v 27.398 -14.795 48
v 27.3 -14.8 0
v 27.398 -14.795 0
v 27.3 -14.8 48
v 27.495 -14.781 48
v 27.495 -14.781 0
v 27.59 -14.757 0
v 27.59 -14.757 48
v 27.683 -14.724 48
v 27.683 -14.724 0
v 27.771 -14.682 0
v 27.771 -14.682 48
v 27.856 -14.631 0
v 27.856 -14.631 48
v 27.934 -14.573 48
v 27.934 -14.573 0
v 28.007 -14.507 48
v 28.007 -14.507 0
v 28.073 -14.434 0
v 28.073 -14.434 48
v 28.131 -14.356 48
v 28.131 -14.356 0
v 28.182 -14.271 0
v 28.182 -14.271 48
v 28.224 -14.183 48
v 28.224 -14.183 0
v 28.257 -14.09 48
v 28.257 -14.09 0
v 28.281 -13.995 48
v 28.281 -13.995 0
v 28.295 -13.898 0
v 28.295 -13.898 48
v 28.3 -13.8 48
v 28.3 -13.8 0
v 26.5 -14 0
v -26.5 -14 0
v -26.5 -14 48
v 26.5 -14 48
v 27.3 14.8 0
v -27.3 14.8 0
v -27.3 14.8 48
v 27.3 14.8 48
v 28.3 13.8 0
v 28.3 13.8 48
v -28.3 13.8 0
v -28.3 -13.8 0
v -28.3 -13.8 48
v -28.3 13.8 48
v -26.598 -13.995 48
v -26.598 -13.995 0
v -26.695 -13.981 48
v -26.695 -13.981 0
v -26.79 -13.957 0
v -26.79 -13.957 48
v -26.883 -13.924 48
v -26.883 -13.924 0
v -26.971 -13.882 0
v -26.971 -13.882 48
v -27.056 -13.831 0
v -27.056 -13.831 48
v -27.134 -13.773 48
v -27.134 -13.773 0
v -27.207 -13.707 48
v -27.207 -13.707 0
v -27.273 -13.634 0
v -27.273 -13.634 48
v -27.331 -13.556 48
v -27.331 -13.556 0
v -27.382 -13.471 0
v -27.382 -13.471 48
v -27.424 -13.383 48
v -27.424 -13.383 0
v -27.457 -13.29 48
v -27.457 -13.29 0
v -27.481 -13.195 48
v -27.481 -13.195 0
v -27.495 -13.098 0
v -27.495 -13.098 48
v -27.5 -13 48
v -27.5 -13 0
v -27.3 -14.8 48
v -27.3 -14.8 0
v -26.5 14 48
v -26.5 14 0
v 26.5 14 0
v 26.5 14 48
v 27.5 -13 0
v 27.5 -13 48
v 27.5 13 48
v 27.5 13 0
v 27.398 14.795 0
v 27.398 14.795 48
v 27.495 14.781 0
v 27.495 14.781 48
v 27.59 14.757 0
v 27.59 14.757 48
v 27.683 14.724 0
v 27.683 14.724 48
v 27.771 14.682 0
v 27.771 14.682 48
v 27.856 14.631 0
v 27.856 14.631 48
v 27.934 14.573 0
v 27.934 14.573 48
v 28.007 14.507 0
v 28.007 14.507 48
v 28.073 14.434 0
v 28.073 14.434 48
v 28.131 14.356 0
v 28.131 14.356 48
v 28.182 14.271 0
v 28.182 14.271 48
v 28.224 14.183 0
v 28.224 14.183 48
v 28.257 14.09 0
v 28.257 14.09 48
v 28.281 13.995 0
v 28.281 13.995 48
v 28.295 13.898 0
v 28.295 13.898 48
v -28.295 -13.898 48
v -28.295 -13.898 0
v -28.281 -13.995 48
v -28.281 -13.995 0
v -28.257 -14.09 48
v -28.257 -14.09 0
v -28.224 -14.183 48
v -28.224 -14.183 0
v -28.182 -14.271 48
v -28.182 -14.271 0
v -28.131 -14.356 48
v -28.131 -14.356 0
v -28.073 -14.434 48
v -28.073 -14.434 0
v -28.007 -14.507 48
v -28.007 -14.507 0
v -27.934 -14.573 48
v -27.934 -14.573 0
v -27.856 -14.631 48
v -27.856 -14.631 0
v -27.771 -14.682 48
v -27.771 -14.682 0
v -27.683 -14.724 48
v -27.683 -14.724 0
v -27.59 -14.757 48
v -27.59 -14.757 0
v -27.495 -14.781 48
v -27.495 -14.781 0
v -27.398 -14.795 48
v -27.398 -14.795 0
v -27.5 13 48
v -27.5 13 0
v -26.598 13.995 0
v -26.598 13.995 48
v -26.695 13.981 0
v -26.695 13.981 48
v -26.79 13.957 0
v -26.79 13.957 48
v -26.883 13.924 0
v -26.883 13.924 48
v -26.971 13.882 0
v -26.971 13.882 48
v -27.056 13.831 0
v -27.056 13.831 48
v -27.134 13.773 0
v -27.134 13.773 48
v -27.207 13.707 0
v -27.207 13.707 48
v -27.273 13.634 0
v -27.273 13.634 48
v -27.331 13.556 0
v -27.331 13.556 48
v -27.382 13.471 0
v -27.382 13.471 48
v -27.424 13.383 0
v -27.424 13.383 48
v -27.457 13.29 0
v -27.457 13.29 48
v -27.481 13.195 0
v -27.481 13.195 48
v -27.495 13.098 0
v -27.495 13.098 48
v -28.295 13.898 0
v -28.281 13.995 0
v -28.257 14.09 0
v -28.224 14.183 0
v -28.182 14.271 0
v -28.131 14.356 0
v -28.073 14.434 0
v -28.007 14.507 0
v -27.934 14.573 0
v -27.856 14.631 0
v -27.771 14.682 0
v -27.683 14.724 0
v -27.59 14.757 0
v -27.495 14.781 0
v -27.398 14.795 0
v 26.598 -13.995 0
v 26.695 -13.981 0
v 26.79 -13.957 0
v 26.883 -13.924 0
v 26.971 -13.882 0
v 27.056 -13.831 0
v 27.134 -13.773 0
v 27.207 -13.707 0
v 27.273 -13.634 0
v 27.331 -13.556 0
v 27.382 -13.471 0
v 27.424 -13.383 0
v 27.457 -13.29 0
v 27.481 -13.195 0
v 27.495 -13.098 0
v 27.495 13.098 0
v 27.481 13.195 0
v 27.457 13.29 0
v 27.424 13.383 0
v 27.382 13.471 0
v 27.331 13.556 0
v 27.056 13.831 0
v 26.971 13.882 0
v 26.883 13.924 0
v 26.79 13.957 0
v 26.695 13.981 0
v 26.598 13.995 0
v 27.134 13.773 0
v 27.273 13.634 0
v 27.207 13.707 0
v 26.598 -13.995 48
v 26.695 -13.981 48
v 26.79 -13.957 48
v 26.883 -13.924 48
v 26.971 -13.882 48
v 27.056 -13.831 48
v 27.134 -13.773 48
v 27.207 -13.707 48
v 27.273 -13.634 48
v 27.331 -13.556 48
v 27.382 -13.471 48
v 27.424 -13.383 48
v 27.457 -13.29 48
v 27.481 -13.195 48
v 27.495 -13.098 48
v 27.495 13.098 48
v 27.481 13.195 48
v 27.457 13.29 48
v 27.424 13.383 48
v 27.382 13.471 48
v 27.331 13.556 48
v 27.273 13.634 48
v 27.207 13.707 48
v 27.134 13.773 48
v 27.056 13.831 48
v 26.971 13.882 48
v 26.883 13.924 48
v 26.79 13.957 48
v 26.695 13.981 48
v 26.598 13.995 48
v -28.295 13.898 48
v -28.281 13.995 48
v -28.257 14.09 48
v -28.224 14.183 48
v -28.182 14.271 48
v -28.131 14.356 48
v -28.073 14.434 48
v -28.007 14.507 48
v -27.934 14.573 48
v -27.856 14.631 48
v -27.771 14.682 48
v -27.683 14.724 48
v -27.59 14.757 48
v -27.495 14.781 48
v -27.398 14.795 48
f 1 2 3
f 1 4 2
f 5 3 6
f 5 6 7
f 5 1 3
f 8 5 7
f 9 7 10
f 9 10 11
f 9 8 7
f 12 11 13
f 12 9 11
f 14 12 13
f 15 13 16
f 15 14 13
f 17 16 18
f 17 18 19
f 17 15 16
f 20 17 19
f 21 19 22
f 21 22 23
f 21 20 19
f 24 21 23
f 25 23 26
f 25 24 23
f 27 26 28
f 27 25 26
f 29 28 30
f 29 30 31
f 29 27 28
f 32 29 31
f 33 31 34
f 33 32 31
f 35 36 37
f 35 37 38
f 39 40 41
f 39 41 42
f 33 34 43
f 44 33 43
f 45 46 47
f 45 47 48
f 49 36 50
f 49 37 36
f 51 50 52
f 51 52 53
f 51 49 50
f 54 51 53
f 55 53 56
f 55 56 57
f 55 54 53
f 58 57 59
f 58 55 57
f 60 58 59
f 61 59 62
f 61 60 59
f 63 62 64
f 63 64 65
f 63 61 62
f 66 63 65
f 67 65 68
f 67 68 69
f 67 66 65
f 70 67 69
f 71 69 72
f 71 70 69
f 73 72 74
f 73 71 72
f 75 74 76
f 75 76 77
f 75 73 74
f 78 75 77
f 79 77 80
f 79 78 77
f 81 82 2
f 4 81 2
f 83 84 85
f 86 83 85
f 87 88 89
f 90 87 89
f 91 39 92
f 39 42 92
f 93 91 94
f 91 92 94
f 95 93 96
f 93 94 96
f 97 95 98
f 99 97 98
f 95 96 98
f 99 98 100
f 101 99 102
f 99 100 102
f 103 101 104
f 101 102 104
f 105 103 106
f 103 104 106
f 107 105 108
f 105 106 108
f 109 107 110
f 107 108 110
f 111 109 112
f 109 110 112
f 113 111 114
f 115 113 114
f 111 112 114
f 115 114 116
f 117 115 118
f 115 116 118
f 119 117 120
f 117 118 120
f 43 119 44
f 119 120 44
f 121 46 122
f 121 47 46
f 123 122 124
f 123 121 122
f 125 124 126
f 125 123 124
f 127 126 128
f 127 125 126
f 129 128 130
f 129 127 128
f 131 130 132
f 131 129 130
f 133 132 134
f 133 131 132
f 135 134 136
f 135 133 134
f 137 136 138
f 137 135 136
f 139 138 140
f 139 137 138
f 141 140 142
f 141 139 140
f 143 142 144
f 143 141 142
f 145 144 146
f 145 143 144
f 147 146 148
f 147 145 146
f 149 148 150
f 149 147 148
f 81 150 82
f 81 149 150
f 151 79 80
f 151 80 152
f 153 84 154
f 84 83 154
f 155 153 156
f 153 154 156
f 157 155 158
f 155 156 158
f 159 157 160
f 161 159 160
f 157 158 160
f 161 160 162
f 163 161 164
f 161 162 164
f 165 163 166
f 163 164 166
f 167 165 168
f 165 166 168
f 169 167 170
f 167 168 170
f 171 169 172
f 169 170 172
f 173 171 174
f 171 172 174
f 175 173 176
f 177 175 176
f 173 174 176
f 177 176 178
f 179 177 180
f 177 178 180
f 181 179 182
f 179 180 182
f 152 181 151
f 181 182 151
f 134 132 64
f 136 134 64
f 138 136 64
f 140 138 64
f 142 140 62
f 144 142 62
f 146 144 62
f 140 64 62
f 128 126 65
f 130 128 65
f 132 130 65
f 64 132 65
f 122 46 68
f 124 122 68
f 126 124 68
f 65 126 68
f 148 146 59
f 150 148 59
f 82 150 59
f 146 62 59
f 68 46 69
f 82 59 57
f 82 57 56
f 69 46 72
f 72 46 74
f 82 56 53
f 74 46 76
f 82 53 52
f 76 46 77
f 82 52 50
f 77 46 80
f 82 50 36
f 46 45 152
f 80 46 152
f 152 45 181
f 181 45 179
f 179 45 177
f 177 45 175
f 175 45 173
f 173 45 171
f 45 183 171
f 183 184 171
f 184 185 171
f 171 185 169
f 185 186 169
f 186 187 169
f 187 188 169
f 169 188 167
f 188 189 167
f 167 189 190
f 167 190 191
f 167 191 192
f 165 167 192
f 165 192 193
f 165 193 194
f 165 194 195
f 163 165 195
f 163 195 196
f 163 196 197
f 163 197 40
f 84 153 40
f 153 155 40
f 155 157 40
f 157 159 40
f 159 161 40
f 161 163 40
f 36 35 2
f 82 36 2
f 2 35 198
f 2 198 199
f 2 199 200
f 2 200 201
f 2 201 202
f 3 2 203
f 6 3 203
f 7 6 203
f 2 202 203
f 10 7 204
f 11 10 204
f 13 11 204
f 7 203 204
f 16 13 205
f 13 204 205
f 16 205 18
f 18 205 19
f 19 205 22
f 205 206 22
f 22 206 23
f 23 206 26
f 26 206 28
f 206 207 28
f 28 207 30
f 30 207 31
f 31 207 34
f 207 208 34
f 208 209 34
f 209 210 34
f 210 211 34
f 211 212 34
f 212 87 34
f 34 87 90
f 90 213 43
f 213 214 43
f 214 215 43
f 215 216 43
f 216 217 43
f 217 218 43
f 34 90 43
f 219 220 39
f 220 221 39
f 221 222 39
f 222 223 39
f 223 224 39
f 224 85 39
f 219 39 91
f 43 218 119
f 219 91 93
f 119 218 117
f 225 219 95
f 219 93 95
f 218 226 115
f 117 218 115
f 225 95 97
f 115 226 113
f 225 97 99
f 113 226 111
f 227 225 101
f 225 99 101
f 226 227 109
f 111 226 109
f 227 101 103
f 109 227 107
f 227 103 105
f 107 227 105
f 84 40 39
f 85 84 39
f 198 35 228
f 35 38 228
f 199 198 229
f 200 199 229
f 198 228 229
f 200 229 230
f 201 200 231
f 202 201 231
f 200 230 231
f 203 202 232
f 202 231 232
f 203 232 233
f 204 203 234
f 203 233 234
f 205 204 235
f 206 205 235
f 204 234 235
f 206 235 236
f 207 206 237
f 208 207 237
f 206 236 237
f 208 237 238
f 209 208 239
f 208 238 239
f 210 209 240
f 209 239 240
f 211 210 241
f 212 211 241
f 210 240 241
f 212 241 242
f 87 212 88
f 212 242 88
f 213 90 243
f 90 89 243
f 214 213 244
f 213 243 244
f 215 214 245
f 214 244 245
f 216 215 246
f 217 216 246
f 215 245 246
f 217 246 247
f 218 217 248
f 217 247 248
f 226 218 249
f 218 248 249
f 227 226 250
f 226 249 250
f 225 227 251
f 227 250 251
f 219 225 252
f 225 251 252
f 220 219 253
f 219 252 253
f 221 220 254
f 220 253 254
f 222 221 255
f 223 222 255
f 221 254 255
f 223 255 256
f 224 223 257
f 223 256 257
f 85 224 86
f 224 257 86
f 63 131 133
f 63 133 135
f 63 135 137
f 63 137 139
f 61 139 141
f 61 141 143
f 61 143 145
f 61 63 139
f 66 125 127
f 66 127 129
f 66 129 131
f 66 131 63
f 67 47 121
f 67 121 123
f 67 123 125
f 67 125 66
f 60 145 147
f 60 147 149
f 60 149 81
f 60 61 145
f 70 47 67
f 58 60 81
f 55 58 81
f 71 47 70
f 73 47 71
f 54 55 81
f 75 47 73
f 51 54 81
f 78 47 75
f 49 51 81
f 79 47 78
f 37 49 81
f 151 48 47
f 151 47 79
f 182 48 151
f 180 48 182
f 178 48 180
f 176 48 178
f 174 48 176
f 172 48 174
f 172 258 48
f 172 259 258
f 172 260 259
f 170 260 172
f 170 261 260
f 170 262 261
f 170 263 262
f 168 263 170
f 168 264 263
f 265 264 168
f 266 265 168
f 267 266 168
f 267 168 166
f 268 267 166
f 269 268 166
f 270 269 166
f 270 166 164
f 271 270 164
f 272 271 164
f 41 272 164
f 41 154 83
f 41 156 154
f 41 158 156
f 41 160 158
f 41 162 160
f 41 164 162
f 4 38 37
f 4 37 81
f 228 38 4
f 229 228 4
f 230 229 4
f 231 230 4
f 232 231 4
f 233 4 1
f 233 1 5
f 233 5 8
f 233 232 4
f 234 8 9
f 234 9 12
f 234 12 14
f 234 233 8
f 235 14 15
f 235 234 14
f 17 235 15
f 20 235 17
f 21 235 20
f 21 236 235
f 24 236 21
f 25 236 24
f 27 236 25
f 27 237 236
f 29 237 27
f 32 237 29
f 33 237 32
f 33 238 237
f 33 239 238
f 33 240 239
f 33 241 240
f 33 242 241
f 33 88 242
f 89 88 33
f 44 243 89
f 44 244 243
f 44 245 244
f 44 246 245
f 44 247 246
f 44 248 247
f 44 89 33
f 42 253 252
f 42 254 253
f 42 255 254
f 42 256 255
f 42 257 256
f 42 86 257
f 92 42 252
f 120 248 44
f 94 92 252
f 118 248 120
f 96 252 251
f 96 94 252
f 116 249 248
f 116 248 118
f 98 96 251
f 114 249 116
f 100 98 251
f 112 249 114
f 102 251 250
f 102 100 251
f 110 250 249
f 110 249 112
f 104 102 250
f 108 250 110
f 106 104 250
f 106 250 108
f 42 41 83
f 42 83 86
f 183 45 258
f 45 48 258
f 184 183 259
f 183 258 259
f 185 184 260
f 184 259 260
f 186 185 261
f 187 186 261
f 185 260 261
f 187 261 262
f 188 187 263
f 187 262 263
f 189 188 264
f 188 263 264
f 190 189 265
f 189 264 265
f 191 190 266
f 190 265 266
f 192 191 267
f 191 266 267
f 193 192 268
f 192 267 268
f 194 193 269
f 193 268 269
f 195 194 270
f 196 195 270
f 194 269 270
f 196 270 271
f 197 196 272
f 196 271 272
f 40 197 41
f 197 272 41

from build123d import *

# Parameters (mm, degrees)
ESQUISSE1_W        = 56.6
ESQUISSE1_H        = 29.6
ESQUISSE1_W_2      = 55
ESQUISSE1_H_2      = 28
BOSS_EXTRU_1_DEPTH = 48
CONG_1_R           = 1


with BuildPart() as part:
    # Esquisse1 → Boss.-Extru.1 (new body)
    with BuildSketch(Plane.XY):
        Rectangle(ESQUISSE1_W, ESQUISSE1_H)
        Rectangle(ESQUISSE1_W_2, ESQUISSE1_H_2, mode=Mode.SUBTRACT)
    extrude(amount=BOSS_EXTRU_1_DEPTH)

    # Congé1
    cong_1_edges = [part.edges().sort_by_distance(p)[0] for p in [
        (27.5, -14, 24),
        (27.5, 14, 24),
        (-27.5, 14, 24),
        (-27.5, -14, 24),
        (-28.3, 14.8, 24),
        (28.3, 14.8, 24),
        (28.3, -14.8, 24),
        (-28.3, -14.8, 24),
    ]]
    fillet(cong_1_edges, radius=CONG_1_R)


solid = part.part
